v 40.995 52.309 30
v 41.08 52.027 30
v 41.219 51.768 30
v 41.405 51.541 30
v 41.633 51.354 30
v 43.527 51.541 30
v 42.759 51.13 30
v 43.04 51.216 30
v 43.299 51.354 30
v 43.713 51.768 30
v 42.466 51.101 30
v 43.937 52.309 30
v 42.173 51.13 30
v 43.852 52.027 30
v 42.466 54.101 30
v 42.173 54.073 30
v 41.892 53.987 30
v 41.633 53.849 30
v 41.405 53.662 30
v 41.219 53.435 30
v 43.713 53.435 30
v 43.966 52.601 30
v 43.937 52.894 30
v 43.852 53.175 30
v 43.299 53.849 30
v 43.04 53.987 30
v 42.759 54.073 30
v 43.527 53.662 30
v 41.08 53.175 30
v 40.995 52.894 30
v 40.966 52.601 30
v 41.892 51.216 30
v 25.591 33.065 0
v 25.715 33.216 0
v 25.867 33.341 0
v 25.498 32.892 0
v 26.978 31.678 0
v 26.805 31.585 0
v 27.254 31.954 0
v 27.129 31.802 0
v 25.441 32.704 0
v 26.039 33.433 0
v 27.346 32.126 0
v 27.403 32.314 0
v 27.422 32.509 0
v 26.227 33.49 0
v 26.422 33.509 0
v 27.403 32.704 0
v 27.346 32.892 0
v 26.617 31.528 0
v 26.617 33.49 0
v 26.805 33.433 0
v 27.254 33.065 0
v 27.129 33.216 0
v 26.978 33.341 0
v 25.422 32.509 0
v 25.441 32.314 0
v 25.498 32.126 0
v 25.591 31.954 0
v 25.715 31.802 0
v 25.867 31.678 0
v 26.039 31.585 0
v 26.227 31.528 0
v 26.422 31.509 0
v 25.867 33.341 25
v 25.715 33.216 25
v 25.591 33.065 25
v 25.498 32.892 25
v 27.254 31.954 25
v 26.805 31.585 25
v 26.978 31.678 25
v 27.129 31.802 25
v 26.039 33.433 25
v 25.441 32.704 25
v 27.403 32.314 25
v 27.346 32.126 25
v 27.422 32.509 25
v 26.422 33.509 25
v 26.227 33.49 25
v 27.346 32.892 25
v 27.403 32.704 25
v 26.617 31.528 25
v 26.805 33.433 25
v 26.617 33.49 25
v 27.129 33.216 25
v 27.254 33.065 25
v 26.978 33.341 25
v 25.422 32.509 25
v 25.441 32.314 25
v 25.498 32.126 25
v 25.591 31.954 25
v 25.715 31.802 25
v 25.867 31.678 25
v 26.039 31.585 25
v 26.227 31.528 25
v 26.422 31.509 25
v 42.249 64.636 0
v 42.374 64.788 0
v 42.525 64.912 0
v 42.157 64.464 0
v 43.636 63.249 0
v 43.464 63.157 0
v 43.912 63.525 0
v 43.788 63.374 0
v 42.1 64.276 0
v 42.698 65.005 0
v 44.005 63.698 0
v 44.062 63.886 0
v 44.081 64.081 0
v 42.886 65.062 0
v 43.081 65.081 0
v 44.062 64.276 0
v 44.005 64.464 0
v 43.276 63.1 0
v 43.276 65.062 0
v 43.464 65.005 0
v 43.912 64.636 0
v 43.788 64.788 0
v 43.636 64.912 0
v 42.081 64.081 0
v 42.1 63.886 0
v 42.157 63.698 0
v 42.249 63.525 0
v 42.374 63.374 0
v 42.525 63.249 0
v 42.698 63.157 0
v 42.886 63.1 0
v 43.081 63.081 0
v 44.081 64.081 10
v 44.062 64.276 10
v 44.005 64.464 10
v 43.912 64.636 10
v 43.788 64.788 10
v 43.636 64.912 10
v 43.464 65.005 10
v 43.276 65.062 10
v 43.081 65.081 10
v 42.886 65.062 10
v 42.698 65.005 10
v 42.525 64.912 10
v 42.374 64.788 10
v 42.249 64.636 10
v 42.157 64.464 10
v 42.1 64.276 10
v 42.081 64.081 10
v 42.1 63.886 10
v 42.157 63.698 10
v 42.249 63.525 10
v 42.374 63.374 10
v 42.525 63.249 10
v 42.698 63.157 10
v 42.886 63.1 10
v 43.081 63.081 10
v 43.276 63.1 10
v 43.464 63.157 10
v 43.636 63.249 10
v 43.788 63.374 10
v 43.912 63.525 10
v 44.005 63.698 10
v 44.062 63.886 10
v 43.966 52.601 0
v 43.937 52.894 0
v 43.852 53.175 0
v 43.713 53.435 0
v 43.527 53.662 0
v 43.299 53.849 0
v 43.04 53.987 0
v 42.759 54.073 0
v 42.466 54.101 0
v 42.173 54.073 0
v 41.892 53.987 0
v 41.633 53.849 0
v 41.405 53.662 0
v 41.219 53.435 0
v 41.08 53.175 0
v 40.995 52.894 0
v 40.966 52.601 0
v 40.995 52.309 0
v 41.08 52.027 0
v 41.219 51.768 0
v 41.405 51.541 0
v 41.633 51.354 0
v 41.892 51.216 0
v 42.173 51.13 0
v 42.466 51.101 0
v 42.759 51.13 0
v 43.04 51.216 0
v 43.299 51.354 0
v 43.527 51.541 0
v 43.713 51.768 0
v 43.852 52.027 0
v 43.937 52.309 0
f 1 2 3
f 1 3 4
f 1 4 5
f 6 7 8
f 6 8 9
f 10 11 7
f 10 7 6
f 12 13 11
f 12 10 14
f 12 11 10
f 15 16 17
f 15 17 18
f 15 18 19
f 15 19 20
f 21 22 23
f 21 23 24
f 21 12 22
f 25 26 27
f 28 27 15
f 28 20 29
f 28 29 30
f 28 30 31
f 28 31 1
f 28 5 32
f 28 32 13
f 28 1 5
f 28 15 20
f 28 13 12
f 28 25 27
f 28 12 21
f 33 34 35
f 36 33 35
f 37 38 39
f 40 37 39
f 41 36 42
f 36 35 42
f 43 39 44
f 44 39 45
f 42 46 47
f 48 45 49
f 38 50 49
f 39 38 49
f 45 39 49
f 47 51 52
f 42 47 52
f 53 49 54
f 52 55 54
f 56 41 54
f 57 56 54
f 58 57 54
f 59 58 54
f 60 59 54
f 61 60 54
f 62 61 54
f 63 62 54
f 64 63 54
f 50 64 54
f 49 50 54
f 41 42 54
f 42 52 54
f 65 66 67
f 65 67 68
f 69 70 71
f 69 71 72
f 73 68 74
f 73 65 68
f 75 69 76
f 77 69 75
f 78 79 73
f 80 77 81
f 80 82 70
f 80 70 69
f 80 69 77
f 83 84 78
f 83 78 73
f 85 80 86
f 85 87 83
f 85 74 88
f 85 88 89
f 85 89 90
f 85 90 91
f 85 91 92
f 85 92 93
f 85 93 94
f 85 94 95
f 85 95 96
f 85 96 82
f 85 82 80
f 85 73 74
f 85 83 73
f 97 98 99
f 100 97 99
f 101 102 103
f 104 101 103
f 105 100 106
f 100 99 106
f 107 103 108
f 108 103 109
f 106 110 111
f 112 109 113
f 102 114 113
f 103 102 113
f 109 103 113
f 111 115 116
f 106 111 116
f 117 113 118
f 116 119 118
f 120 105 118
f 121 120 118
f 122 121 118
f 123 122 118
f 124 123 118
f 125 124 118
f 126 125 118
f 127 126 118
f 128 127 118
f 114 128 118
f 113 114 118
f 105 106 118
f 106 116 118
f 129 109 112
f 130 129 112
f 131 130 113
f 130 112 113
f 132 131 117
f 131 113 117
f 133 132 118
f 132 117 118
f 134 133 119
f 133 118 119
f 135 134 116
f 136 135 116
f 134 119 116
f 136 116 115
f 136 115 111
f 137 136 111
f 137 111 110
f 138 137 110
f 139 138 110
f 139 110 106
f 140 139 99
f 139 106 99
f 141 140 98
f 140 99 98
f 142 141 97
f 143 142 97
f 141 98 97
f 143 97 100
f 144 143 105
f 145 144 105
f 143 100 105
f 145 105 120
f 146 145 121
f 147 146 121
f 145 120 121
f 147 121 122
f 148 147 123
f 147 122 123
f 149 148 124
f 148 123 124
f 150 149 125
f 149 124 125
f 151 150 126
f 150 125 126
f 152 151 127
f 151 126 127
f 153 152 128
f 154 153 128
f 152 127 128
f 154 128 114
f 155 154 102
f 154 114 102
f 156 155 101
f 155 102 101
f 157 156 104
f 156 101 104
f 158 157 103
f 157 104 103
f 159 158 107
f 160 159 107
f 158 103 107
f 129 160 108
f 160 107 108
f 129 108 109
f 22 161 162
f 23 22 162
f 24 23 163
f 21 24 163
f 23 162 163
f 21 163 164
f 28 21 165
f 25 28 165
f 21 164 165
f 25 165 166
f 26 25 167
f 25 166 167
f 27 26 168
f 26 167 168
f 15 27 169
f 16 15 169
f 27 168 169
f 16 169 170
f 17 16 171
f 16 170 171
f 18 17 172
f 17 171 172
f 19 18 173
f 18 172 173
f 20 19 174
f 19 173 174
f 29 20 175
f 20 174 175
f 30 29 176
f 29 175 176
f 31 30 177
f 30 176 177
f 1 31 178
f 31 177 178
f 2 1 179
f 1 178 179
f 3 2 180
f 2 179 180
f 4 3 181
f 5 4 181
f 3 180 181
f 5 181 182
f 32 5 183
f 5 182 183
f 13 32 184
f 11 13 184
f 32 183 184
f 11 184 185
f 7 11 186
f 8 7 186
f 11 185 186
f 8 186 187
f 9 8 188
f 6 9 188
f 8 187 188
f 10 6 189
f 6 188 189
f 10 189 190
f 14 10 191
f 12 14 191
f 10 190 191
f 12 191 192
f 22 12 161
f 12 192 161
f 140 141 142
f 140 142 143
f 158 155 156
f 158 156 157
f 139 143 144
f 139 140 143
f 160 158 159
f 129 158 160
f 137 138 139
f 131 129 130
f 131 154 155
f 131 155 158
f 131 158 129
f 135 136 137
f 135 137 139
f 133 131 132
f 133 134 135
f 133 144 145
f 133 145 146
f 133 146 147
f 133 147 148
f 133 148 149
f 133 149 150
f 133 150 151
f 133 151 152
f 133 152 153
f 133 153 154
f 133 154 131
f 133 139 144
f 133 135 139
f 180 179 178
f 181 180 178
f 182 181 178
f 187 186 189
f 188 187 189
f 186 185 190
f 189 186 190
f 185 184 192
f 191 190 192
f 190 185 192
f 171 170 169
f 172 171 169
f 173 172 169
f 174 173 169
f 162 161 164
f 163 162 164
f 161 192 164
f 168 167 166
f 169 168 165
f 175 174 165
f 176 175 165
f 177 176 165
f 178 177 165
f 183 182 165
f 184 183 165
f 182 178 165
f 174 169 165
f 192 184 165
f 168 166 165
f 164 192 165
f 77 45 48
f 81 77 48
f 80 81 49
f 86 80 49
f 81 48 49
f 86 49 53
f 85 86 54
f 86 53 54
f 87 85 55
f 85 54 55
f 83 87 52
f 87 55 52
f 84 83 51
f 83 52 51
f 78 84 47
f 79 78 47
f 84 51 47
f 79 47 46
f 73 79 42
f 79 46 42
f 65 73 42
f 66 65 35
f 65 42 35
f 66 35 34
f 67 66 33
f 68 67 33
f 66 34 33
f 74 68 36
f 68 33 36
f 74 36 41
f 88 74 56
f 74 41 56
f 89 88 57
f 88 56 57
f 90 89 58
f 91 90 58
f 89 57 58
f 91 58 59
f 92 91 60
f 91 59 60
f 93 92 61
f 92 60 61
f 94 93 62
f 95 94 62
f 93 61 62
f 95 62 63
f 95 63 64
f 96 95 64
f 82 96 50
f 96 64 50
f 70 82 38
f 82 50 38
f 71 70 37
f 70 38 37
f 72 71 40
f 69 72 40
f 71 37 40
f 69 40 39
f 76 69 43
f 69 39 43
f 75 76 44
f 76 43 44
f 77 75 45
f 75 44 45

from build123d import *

# Parameters (mm, degrees)
F0_R     = 1
F1_DEPTH = 25
F2_R     = 1
F3_DEPTH = 10
F4_R     = 1.5
F5_DEPTH = 30


# Not quite as in the source:
# - a feature names something its author has since deleted; it is built from what else it names


with BuildPart() as f1:
    # F0 (on Top) → F1 (new body)
    with BuildSketch(Plane.XY):
        with Locations((26.4221140966, 32.5091108651)):
            Circle(F0_R)
    extrude(amount=F1_DEPTH)


with BuildPart() as f3:
    # F2 (on Top) → F3 (new body)
    with BuildSketch(Plane.XY):
        with Locations((43.0808849633, 64.0808865428)):
            Circle(F2_R)
    extrude(amount=F3_DEPTH)


with BuildPart() as f5:
    # F4 (on Top) → F5 (new body)
    with BuildSketch(Plane.XY):
        with Locations((42.4658991396, 52.6014268398)):
            Circle(F4_R)
    extrude(amount=F5_DEPTH)


solid = Compound([f1.part, f3.part, f5.part])
